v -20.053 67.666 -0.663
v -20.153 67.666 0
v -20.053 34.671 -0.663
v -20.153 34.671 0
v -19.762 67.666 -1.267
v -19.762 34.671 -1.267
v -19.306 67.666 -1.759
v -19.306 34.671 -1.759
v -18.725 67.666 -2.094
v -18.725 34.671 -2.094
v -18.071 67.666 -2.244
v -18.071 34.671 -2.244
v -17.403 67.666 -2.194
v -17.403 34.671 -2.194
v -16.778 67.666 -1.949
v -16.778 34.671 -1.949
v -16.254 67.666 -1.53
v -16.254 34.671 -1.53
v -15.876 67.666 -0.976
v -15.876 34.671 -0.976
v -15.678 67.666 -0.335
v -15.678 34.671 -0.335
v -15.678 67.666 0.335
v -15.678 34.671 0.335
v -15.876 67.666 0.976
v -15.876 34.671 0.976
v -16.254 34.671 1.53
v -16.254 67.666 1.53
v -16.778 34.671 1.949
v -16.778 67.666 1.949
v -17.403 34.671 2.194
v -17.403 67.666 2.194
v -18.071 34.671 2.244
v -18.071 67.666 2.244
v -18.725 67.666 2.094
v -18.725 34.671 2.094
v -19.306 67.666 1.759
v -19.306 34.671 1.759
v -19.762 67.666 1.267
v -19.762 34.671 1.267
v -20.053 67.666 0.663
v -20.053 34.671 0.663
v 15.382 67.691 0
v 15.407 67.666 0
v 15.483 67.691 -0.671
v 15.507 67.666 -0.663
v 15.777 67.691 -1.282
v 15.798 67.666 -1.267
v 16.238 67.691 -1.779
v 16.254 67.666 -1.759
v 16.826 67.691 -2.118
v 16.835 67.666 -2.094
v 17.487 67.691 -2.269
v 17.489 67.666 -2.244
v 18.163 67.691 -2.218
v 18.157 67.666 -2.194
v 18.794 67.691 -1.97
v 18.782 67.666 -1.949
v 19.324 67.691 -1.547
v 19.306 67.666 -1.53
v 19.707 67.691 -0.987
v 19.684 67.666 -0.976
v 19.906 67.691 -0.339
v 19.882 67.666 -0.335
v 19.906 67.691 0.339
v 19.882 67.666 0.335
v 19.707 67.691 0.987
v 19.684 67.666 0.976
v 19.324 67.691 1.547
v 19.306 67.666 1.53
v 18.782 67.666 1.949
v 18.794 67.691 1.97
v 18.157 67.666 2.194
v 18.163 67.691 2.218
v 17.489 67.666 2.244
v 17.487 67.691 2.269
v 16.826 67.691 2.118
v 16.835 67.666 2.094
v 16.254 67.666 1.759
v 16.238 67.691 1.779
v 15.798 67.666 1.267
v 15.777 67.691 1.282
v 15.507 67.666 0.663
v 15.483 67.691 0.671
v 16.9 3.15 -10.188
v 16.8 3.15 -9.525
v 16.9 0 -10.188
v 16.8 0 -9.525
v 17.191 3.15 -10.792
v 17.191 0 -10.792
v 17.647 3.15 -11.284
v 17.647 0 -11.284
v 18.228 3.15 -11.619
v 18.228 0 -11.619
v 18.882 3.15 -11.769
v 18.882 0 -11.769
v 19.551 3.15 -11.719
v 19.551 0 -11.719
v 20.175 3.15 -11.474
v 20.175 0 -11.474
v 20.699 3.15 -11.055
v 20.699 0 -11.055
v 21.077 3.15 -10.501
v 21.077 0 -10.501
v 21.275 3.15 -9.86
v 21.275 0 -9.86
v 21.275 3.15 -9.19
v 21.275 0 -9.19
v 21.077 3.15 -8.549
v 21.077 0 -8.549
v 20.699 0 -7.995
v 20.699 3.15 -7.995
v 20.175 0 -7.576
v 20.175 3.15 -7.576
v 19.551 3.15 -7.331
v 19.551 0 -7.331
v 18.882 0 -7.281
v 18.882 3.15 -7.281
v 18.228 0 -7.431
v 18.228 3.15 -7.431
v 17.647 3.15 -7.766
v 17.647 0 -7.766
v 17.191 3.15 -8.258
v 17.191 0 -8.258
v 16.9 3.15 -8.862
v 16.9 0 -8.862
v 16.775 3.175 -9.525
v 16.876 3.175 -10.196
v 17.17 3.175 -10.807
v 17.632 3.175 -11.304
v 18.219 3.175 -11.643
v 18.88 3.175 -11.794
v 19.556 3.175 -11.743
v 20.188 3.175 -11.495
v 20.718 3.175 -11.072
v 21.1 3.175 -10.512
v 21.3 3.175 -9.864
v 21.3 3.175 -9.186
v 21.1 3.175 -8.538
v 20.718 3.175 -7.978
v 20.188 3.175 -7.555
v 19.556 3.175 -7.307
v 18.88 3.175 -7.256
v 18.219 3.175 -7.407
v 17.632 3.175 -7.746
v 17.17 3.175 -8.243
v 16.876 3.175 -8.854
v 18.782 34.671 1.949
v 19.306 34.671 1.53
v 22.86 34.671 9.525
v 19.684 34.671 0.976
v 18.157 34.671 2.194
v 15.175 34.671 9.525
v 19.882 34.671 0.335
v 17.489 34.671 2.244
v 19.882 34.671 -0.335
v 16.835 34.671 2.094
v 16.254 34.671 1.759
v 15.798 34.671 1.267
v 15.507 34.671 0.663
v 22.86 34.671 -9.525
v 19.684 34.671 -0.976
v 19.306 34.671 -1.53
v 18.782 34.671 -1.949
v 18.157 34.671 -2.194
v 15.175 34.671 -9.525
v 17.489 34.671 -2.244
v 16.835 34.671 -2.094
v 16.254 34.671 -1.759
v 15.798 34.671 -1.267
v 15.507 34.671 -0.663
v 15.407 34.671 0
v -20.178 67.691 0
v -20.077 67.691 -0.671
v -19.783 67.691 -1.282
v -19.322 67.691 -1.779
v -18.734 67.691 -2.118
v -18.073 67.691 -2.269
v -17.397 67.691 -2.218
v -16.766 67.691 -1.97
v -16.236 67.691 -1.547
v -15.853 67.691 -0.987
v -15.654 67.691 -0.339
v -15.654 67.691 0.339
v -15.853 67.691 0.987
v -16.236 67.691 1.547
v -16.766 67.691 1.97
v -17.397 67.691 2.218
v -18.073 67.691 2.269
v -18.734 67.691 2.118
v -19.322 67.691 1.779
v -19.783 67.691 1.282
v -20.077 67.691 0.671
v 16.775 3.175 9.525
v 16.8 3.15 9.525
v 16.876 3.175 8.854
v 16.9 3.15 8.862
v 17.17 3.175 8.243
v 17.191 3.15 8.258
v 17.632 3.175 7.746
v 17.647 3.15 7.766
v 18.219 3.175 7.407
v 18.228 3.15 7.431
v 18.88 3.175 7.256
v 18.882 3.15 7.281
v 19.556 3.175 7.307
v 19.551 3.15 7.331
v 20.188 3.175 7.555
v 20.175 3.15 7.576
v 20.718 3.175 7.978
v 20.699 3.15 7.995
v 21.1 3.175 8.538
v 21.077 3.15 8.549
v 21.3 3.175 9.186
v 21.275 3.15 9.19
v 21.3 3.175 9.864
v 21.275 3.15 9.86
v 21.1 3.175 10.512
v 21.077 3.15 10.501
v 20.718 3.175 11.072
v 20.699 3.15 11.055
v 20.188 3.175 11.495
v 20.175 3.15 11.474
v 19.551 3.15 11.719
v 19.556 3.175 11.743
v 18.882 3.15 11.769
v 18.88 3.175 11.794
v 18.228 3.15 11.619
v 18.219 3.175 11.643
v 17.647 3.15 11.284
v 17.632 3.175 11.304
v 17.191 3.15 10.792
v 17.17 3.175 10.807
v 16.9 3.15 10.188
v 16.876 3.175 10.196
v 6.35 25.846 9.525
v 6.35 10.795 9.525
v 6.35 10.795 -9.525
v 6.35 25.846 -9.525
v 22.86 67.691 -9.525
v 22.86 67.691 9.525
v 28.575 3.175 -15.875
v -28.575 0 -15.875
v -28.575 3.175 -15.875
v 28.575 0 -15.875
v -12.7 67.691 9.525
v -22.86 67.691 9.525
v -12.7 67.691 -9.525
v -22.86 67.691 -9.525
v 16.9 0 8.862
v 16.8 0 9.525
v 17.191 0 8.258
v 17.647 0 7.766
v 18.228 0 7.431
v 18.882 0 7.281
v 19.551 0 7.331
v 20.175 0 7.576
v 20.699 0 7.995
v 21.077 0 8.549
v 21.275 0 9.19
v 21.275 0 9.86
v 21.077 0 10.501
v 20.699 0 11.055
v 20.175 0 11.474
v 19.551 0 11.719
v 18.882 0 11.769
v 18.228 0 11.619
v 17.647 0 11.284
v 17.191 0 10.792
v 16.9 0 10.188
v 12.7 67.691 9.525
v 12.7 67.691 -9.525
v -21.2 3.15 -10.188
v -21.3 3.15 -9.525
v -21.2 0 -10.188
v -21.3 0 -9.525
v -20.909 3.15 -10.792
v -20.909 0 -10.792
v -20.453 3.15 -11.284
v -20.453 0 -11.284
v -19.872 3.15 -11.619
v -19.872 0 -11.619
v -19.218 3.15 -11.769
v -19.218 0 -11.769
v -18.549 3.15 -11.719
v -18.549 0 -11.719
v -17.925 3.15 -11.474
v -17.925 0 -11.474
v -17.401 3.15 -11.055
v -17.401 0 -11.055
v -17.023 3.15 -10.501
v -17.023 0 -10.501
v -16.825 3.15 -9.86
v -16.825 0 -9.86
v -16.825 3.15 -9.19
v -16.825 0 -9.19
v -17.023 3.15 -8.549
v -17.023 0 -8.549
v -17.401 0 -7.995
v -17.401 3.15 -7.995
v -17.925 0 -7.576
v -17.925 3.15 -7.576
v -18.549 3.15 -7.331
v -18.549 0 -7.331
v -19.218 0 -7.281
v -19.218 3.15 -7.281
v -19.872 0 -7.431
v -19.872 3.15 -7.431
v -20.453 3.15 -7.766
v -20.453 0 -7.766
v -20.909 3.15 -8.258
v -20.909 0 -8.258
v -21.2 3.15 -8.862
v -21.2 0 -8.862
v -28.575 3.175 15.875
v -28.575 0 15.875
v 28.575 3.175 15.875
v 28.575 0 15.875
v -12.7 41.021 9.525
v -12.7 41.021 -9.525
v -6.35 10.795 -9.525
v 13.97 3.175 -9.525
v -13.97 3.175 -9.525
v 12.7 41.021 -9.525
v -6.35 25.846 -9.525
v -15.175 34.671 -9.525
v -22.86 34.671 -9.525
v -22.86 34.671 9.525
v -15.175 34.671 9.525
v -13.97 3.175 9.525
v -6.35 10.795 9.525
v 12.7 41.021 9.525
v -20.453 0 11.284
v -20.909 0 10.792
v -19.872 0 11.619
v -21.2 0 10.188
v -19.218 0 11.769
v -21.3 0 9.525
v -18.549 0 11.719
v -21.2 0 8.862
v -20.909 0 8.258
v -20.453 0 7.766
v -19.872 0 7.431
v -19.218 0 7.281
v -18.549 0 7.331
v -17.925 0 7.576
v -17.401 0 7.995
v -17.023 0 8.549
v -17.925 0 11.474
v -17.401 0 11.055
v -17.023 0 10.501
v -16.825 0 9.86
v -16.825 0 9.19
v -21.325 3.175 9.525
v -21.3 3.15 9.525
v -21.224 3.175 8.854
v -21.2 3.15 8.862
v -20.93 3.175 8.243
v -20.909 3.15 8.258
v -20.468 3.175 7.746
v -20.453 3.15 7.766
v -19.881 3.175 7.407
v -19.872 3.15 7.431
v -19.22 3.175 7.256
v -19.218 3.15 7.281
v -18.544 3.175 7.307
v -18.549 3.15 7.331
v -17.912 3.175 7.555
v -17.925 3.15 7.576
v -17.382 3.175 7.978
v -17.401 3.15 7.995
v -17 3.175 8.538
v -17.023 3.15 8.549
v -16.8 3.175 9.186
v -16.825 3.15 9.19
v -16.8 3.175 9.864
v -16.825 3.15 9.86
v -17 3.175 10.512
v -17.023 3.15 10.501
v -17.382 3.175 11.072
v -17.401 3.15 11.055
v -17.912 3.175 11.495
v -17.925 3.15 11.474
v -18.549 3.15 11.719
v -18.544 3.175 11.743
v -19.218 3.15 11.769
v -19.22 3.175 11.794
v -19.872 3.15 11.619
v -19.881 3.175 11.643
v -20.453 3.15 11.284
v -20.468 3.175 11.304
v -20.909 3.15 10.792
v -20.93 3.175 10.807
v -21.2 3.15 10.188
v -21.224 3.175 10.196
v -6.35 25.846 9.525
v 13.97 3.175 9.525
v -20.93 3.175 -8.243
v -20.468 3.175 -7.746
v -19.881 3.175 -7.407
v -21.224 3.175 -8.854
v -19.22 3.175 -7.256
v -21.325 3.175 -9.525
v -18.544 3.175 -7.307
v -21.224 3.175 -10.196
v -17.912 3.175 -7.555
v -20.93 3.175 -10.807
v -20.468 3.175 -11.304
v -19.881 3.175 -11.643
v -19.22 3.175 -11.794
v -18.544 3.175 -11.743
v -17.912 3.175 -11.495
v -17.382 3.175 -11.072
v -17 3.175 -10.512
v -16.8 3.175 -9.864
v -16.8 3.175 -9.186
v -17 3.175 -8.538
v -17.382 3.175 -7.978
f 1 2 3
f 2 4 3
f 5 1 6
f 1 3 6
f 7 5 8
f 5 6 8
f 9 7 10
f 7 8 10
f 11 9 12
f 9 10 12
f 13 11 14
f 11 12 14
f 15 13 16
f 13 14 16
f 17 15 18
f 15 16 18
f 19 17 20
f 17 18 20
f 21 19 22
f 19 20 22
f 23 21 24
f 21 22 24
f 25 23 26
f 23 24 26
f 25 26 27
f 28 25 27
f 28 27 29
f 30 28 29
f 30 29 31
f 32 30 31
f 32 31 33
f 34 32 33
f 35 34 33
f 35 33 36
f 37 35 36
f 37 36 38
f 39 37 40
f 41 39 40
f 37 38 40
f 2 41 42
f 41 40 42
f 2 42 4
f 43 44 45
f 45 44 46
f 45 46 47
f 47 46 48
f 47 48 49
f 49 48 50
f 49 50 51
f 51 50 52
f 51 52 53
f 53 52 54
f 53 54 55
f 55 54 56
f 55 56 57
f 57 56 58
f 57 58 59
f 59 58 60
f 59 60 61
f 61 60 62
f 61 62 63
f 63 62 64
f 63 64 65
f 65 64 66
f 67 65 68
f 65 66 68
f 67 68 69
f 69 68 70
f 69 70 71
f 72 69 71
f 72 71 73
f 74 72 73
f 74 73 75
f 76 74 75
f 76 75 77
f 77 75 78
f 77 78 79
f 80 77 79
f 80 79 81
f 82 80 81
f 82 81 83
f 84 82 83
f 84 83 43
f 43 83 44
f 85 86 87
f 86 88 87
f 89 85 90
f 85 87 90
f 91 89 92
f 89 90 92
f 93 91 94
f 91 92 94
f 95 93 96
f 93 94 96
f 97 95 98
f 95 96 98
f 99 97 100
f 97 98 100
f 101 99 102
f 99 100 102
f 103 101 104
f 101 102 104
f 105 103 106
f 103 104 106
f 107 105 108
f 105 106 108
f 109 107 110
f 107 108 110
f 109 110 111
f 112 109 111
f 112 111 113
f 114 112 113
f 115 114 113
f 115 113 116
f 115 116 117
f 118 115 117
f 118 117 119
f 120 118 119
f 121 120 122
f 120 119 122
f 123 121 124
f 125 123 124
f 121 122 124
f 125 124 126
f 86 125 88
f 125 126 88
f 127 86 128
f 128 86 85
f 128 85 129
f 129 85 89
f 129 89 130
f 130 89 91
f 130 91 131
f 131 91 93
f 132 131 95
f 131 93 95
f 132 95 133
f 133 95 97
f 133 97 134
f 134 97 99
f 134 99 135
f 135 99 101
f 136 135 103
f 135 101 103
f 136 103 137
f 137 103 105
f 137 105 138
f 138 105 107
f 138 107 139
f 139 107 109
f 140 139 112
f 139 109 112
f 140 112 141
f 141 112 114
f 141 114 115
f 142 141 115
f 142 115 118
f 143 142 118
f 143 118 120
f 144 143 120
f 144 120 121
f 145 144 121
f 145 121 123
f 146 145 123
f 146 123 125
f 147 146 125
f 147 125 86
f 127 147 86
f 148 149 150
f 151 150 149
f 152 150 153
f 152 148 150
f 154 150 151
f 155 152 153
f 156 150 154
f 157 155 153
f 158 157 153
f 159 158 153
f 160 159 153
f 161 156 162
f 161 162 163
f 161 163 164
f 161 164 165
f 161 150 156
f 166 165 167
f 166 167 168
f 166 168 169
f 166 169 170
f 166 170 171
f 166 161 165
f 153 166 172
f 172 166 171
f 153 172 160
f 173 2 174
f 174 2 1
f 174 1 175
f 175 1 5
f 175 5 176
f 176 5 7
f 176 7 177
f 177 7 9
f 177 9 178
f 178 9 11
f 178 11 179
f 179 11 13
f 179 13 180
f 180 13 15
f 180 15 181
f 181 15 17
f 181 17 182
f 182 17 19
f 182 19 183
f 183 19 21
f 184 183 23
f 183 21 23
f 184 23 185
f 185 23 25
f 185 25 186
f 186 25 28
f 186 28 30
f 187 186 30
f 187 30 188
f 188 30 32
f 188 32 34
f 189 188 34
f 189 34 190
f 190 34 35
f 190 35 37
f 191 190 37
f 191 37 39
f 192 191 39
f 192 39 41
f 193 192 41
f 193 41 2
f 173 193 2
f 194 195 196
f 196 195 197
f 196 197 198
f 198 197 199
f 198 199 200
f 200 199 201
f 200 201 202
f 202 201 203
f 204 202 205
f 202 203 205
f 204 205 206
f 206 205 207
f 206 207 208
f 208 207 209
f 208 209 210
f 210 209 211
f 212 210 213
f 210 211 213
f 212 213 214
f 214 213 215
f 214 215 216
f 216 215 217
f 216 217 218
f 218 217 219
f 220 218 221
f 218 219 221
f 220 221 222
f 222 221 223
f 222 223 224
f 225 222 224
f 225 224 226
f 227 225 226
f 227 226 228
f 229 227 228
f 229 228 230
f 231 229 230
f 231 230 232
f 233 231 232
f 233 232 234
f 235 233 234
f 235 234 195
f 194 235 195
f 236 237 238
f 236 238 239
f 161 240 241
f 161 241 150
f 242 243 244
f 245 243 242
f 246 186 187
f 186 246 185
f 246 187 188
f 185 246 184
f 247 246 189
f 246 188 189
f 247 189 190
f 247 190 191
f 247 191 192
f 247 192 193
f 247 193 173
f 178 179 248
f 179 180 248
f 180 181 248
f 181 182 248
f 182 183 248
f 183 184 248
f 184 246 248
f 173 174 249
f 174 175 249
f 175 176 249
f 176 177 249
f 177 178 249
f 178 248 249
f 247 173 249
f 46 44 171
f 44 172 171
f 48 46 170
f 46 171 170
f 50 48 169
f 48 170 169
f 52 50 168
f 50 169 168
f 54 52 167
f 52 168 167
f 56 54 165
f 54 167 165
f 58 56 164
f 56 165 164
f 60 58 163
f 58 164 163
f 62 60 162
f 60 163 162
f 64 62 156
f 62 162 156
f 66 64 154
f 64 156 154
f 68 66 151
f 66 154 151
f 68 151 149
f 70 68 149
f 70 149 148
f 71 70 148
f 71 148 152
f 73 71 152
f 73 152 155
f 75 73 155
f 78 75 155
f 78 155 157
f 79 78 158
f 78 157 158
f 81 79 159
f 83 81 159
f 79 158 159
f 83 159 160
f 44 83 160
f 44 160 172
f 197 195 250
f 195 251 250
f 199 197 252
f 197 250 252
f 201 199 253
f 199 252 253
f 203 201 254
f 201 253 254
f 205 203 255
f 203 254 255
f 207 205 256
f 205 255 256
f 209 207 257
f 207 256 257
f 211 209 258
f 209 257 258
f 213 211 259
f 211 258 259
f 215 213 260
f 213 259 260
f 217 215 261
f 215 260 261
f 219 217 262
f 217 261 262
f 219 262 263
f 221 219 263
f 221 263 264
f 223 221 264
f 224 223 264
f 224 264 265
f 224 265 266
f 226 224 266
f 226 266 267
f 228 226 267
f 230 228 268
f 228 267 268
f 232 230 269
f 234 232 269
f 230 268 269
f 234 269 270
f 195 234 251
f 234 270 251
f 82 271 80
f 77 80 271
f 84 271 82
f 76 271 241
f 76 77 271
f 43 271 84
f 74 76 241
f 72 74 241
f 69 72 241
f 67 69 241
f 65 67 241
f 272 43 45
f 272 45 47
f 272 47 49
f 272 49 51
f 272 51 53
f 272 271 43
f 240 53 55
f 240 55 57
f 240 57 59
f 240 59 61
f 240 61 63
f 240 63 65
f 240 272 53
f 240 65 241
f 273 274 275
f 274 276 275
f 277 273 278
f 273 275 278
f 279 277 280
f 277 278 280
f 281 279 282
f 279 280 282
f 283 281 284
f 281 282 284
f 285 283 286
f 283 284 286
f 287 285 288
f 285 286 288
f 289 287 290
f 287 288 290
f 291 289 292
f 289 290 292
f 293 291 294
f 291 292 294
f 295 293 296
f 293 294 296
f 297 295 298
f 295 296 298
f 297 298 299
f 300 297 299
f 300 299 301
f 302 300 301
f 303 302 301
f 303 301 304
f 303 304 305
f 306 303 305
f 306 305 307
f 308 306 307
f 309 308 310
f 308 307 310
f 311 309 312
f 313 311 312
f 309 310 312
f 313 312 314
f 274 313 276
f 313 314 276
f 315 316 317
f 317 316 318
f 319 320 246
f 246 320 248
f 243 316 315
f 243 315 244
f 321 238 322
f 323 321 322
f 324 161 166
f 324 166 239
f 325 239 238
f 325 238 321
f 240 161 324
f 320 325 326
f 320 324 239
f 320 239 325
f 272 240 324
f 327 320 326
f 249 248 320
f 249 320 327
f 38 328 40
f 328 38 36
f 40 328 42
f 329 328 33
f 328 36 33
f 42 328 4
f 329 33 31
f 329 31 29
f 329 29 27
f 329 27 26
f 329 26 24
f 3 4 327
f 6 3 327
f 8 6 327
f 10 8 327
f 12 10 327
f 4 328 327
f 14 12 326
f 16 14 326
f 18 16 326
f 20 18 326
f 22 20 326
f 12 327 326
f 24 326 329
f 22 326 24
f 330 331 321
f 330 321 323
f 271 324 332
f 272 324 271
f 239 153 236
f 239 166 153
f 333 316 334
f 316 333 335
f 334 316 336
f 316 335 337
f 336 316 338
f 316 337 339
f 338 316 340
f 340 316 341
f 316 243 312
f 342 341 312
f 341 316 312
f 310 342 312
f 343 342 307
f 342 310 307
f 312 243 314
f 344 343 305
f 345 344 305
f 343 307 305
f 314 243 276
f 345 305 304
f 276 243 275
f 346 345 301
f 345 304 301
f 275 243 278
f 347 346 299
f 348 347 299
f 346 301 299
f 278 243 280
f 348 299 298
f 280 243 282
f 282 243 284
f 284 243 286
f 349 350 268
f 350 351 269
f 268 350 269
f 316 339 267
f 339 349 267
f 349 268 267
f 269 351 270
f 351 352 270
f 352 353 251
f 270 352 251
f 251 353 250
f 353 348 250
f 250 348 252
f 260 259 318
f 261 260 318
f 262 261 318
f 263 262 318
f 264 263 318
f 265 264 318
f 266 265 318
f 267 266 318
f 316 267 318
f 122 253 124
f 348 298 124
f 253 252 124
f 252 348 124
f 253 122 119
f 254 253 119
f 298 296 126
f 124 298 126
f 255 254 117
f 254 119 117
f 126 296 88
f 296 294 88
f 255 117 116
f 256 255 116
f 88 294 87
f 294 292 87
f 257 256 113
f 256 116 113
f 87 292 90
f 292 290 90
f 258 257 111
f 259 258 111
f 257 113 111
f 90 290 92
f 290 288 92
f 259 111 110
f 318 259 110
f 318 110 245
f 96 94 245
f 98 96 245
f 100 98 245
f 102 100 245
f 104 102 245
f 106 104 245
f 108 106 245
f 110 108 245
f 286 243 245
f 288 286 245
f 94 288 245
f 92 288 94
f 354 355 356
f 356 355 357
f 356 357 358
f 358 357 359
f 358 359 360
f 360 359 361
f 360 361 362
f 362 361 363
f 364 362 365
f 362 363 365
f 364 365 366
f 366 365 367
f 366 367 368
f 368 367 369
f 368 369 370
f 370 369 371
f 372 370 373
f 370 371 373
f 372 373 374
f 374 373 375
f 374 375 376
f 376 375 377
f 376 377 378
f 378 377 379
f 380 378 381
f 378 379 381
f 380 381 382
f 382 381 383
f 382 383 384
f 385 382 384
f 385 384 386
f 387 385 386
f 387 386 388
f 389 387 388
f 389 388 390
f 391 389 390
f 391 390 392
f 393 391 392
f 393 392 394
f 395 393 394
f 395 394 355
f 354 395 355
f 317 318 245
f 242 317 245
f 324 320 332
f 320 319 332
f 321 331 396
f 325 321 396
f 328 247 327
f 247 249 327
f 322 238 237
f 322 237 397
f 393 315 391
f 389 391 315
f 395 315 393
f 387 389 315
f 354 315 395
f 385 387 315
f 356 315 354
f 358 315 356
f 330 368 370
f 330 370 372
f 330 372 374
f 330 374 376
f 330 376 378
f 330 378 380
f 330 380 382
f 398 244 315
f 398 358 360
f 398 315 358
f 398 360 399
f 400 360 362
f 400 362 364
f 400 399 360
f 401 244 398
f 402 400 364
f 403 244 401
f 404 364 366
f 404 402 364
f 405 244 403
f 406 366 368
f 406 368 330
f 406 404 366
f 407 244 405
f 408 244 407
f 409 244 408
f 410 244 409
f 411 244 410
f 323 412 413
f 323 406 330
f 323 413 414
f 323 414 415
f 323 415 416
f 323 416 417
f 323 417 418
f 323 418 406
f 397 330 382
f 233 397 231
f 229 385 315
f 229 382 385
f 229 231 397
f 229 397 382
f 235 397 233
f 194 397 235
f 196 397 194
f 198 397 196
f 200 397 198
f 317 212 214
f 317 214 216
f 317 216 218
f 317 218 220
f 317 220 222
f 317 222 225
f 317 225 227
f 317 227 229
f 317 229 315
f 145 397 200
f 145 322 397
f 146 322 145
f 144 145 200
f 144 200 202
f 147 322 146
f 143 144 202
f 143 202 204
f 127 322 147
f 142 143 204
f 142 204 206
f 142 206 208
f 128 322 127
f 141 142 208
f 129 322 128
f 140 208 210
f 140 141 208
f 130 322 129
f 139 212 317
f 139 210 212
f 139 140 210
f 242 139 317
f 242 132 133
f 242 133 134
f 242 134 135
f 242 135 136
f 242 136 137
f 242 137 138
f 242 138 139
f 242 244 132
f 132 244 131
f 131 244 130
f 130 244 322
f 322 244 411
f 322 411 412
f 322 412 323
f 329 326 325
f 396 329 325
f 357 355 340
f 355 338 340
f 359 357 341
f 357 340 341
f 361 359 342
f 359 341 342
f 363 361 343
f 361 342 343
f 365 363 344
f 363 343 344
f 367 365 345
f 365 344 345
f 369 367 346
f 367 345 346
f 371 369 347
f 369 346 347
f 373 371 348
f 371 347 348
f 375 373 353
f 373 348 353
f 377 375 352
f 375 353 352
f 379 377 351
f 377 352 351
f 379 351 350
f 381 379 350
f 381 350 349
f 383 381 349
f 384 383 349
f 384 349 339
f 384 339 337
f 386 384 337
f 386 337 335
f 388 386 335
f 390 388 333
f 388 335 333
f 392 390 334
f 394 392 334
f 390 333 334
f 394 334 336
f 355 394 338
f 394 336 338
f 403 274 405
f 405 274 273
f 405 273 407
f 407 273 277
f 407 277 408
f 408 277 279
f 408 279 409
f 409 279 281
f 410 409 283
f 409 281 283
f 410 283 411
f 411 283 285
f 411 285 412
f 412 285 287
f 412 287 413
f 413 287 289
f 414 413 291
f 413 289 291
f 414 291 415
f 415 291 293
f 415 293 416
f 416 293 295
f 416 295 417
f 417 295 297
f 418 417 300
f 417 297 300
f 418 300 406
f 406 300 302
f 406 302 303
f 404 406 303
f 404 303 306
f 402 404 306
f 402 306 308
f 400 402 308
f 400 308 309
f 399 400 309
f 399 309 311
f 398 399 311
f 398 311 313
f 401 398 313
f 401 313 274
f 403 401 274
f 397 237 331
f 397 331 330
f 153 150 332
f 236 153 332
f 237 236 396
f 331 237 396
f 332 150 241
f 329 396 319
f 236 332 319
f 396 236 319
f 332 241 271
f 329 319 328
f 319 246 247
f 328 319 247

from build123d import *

# Parameters (mm, degrees)
SKETCH1_W                      = 57.15
SKETCH1_H                      = 31.75
BOSS_EXTRUDE1_DEPTH            = 3.175
M4_CLEARANCE_HOLE1_D           = 4.5
M4_CLEARANCE_HOLE1_CSINK_D     = 4.55
M4_CLEARANCE_HOLE1_CSINK_ANGLE = 90
SKETCH5_W                      = 12.7
SKETCH5_H                      = 37.846
BOSS_EXTRUDE2_DEPTH            = 9.525
BOSS_EXTRUDE3_DEPTH            = 9.525
M4_CLEARANCE_HOLE2_D           = 4.5
M4_CLEARANCE_HOLE2_DEPTH       = 33.02
M4_CLEARANCE_HOLE2_CSINK_D     = 4.55
M4_CLEARANCE_HOLE2_CSINK_ANGLE = 90
M4_CLEARANCE_HOLE2_TIP         = 1.351936393


with BuildPart() as part:
    # Sketch1 → Boss-Extrude1 (new body)
    with BuildSketch(Plane(origin=(0, 0, 0), x_dir=(1, 0, 0), z_dir=(0, 1, 0))):
        Rectangle(SKETCH1_W, SKETCH1_H)
    extrude(amount=BOSS_EXTRUDE1_DEPTH)

    # M4 Clearance Hole1 (through all)
    with Locations(Plane(origin=(0, 3.175, 0), x_dir=(1, 0, 0), z_dir=(0, 1, 0))):
        with Locations((-19.05, 9.525), (19.05, 9.525), (19.05, -9.525), (-19.05, -9.525)):
            CounterSinkHole(M4_CLEARANCE_HOLE1_D / 2, M4_CLEARANCE_HOLE1_CSINK_D / 2, counter_sink_angle=M4_CLEARANCE_HOLE1_CSINK_ANGLE)

    # Sketch5 → Boss-Extrude2 (add, symmetric)
    with BuildSketch(Plane.XY):
        with Locations((0, 22.098)):
            Rectangle(SKETCH5_W, SKETCH5_H)
    extrude(amount=BOSS_EXTRUDE2_DEPTH, both=True)

    # Sketch6 → Boss-Extrude3 (add, symmetric)
    with BuildSketch(Plane.XY):
        Polygon((6.35, 41.021), (12.7, 41.021), (12.7, 67.691), (22.86, 67.691), (22.86, 34.671), (15.175054079, 34.671), (6.35, 25.845945921), align=None)
        Polygon((-6.35, 41.021), (-12.7, 41.021), (-12.7, 67.691), (-22.86, 67.691), (-22.86, 34.671), (-15.175054079, 34.671), (-6.35, 25.845945921), align=None)
        Polygon((-6.35, 10.795), (-13.97, 3.175), (-6.35, 3.175), align=None)
        Polygon((6.35, 3.175), (6.35, 10.795), (13.97, 3.175), align=None)
    extrude(amount=BOSS_EXTRUDE3_DEPTH, both=True)

    # M4 Clearance Hole2
    with Locations(Plane(origin=(0, 67.691, 0), x_dir=(1, 0, 0), z_dir=(0, 1, 0))):
        with Locations((-17.903194087, 0), (17.656805913, 0)):
            CounterSinkHole(M4_CLEARANCE_HOLE2_D / 2, M4_CLEARANCE_HOLE2_CSINK_D / 2, depth=M4_CLEARANCE_HOLE2_DEPTH, counter_sink_angle=M4_CLEARANCE_HOLE2_CSINK_ANGLE)
            with Locations((0, 0, -(M4_CLEARANCE_HOLE2_DEPTH + M4_CLEARANCE_HOLE2_TIP / 2))):  # 118° drill point
                Cone(0, M4_CLEARANCE_HOLE2_D / 2, M4_CLEARANCE_HOLE2_TIP, mode=Mode.SUBTRACT)


solid = part.part
